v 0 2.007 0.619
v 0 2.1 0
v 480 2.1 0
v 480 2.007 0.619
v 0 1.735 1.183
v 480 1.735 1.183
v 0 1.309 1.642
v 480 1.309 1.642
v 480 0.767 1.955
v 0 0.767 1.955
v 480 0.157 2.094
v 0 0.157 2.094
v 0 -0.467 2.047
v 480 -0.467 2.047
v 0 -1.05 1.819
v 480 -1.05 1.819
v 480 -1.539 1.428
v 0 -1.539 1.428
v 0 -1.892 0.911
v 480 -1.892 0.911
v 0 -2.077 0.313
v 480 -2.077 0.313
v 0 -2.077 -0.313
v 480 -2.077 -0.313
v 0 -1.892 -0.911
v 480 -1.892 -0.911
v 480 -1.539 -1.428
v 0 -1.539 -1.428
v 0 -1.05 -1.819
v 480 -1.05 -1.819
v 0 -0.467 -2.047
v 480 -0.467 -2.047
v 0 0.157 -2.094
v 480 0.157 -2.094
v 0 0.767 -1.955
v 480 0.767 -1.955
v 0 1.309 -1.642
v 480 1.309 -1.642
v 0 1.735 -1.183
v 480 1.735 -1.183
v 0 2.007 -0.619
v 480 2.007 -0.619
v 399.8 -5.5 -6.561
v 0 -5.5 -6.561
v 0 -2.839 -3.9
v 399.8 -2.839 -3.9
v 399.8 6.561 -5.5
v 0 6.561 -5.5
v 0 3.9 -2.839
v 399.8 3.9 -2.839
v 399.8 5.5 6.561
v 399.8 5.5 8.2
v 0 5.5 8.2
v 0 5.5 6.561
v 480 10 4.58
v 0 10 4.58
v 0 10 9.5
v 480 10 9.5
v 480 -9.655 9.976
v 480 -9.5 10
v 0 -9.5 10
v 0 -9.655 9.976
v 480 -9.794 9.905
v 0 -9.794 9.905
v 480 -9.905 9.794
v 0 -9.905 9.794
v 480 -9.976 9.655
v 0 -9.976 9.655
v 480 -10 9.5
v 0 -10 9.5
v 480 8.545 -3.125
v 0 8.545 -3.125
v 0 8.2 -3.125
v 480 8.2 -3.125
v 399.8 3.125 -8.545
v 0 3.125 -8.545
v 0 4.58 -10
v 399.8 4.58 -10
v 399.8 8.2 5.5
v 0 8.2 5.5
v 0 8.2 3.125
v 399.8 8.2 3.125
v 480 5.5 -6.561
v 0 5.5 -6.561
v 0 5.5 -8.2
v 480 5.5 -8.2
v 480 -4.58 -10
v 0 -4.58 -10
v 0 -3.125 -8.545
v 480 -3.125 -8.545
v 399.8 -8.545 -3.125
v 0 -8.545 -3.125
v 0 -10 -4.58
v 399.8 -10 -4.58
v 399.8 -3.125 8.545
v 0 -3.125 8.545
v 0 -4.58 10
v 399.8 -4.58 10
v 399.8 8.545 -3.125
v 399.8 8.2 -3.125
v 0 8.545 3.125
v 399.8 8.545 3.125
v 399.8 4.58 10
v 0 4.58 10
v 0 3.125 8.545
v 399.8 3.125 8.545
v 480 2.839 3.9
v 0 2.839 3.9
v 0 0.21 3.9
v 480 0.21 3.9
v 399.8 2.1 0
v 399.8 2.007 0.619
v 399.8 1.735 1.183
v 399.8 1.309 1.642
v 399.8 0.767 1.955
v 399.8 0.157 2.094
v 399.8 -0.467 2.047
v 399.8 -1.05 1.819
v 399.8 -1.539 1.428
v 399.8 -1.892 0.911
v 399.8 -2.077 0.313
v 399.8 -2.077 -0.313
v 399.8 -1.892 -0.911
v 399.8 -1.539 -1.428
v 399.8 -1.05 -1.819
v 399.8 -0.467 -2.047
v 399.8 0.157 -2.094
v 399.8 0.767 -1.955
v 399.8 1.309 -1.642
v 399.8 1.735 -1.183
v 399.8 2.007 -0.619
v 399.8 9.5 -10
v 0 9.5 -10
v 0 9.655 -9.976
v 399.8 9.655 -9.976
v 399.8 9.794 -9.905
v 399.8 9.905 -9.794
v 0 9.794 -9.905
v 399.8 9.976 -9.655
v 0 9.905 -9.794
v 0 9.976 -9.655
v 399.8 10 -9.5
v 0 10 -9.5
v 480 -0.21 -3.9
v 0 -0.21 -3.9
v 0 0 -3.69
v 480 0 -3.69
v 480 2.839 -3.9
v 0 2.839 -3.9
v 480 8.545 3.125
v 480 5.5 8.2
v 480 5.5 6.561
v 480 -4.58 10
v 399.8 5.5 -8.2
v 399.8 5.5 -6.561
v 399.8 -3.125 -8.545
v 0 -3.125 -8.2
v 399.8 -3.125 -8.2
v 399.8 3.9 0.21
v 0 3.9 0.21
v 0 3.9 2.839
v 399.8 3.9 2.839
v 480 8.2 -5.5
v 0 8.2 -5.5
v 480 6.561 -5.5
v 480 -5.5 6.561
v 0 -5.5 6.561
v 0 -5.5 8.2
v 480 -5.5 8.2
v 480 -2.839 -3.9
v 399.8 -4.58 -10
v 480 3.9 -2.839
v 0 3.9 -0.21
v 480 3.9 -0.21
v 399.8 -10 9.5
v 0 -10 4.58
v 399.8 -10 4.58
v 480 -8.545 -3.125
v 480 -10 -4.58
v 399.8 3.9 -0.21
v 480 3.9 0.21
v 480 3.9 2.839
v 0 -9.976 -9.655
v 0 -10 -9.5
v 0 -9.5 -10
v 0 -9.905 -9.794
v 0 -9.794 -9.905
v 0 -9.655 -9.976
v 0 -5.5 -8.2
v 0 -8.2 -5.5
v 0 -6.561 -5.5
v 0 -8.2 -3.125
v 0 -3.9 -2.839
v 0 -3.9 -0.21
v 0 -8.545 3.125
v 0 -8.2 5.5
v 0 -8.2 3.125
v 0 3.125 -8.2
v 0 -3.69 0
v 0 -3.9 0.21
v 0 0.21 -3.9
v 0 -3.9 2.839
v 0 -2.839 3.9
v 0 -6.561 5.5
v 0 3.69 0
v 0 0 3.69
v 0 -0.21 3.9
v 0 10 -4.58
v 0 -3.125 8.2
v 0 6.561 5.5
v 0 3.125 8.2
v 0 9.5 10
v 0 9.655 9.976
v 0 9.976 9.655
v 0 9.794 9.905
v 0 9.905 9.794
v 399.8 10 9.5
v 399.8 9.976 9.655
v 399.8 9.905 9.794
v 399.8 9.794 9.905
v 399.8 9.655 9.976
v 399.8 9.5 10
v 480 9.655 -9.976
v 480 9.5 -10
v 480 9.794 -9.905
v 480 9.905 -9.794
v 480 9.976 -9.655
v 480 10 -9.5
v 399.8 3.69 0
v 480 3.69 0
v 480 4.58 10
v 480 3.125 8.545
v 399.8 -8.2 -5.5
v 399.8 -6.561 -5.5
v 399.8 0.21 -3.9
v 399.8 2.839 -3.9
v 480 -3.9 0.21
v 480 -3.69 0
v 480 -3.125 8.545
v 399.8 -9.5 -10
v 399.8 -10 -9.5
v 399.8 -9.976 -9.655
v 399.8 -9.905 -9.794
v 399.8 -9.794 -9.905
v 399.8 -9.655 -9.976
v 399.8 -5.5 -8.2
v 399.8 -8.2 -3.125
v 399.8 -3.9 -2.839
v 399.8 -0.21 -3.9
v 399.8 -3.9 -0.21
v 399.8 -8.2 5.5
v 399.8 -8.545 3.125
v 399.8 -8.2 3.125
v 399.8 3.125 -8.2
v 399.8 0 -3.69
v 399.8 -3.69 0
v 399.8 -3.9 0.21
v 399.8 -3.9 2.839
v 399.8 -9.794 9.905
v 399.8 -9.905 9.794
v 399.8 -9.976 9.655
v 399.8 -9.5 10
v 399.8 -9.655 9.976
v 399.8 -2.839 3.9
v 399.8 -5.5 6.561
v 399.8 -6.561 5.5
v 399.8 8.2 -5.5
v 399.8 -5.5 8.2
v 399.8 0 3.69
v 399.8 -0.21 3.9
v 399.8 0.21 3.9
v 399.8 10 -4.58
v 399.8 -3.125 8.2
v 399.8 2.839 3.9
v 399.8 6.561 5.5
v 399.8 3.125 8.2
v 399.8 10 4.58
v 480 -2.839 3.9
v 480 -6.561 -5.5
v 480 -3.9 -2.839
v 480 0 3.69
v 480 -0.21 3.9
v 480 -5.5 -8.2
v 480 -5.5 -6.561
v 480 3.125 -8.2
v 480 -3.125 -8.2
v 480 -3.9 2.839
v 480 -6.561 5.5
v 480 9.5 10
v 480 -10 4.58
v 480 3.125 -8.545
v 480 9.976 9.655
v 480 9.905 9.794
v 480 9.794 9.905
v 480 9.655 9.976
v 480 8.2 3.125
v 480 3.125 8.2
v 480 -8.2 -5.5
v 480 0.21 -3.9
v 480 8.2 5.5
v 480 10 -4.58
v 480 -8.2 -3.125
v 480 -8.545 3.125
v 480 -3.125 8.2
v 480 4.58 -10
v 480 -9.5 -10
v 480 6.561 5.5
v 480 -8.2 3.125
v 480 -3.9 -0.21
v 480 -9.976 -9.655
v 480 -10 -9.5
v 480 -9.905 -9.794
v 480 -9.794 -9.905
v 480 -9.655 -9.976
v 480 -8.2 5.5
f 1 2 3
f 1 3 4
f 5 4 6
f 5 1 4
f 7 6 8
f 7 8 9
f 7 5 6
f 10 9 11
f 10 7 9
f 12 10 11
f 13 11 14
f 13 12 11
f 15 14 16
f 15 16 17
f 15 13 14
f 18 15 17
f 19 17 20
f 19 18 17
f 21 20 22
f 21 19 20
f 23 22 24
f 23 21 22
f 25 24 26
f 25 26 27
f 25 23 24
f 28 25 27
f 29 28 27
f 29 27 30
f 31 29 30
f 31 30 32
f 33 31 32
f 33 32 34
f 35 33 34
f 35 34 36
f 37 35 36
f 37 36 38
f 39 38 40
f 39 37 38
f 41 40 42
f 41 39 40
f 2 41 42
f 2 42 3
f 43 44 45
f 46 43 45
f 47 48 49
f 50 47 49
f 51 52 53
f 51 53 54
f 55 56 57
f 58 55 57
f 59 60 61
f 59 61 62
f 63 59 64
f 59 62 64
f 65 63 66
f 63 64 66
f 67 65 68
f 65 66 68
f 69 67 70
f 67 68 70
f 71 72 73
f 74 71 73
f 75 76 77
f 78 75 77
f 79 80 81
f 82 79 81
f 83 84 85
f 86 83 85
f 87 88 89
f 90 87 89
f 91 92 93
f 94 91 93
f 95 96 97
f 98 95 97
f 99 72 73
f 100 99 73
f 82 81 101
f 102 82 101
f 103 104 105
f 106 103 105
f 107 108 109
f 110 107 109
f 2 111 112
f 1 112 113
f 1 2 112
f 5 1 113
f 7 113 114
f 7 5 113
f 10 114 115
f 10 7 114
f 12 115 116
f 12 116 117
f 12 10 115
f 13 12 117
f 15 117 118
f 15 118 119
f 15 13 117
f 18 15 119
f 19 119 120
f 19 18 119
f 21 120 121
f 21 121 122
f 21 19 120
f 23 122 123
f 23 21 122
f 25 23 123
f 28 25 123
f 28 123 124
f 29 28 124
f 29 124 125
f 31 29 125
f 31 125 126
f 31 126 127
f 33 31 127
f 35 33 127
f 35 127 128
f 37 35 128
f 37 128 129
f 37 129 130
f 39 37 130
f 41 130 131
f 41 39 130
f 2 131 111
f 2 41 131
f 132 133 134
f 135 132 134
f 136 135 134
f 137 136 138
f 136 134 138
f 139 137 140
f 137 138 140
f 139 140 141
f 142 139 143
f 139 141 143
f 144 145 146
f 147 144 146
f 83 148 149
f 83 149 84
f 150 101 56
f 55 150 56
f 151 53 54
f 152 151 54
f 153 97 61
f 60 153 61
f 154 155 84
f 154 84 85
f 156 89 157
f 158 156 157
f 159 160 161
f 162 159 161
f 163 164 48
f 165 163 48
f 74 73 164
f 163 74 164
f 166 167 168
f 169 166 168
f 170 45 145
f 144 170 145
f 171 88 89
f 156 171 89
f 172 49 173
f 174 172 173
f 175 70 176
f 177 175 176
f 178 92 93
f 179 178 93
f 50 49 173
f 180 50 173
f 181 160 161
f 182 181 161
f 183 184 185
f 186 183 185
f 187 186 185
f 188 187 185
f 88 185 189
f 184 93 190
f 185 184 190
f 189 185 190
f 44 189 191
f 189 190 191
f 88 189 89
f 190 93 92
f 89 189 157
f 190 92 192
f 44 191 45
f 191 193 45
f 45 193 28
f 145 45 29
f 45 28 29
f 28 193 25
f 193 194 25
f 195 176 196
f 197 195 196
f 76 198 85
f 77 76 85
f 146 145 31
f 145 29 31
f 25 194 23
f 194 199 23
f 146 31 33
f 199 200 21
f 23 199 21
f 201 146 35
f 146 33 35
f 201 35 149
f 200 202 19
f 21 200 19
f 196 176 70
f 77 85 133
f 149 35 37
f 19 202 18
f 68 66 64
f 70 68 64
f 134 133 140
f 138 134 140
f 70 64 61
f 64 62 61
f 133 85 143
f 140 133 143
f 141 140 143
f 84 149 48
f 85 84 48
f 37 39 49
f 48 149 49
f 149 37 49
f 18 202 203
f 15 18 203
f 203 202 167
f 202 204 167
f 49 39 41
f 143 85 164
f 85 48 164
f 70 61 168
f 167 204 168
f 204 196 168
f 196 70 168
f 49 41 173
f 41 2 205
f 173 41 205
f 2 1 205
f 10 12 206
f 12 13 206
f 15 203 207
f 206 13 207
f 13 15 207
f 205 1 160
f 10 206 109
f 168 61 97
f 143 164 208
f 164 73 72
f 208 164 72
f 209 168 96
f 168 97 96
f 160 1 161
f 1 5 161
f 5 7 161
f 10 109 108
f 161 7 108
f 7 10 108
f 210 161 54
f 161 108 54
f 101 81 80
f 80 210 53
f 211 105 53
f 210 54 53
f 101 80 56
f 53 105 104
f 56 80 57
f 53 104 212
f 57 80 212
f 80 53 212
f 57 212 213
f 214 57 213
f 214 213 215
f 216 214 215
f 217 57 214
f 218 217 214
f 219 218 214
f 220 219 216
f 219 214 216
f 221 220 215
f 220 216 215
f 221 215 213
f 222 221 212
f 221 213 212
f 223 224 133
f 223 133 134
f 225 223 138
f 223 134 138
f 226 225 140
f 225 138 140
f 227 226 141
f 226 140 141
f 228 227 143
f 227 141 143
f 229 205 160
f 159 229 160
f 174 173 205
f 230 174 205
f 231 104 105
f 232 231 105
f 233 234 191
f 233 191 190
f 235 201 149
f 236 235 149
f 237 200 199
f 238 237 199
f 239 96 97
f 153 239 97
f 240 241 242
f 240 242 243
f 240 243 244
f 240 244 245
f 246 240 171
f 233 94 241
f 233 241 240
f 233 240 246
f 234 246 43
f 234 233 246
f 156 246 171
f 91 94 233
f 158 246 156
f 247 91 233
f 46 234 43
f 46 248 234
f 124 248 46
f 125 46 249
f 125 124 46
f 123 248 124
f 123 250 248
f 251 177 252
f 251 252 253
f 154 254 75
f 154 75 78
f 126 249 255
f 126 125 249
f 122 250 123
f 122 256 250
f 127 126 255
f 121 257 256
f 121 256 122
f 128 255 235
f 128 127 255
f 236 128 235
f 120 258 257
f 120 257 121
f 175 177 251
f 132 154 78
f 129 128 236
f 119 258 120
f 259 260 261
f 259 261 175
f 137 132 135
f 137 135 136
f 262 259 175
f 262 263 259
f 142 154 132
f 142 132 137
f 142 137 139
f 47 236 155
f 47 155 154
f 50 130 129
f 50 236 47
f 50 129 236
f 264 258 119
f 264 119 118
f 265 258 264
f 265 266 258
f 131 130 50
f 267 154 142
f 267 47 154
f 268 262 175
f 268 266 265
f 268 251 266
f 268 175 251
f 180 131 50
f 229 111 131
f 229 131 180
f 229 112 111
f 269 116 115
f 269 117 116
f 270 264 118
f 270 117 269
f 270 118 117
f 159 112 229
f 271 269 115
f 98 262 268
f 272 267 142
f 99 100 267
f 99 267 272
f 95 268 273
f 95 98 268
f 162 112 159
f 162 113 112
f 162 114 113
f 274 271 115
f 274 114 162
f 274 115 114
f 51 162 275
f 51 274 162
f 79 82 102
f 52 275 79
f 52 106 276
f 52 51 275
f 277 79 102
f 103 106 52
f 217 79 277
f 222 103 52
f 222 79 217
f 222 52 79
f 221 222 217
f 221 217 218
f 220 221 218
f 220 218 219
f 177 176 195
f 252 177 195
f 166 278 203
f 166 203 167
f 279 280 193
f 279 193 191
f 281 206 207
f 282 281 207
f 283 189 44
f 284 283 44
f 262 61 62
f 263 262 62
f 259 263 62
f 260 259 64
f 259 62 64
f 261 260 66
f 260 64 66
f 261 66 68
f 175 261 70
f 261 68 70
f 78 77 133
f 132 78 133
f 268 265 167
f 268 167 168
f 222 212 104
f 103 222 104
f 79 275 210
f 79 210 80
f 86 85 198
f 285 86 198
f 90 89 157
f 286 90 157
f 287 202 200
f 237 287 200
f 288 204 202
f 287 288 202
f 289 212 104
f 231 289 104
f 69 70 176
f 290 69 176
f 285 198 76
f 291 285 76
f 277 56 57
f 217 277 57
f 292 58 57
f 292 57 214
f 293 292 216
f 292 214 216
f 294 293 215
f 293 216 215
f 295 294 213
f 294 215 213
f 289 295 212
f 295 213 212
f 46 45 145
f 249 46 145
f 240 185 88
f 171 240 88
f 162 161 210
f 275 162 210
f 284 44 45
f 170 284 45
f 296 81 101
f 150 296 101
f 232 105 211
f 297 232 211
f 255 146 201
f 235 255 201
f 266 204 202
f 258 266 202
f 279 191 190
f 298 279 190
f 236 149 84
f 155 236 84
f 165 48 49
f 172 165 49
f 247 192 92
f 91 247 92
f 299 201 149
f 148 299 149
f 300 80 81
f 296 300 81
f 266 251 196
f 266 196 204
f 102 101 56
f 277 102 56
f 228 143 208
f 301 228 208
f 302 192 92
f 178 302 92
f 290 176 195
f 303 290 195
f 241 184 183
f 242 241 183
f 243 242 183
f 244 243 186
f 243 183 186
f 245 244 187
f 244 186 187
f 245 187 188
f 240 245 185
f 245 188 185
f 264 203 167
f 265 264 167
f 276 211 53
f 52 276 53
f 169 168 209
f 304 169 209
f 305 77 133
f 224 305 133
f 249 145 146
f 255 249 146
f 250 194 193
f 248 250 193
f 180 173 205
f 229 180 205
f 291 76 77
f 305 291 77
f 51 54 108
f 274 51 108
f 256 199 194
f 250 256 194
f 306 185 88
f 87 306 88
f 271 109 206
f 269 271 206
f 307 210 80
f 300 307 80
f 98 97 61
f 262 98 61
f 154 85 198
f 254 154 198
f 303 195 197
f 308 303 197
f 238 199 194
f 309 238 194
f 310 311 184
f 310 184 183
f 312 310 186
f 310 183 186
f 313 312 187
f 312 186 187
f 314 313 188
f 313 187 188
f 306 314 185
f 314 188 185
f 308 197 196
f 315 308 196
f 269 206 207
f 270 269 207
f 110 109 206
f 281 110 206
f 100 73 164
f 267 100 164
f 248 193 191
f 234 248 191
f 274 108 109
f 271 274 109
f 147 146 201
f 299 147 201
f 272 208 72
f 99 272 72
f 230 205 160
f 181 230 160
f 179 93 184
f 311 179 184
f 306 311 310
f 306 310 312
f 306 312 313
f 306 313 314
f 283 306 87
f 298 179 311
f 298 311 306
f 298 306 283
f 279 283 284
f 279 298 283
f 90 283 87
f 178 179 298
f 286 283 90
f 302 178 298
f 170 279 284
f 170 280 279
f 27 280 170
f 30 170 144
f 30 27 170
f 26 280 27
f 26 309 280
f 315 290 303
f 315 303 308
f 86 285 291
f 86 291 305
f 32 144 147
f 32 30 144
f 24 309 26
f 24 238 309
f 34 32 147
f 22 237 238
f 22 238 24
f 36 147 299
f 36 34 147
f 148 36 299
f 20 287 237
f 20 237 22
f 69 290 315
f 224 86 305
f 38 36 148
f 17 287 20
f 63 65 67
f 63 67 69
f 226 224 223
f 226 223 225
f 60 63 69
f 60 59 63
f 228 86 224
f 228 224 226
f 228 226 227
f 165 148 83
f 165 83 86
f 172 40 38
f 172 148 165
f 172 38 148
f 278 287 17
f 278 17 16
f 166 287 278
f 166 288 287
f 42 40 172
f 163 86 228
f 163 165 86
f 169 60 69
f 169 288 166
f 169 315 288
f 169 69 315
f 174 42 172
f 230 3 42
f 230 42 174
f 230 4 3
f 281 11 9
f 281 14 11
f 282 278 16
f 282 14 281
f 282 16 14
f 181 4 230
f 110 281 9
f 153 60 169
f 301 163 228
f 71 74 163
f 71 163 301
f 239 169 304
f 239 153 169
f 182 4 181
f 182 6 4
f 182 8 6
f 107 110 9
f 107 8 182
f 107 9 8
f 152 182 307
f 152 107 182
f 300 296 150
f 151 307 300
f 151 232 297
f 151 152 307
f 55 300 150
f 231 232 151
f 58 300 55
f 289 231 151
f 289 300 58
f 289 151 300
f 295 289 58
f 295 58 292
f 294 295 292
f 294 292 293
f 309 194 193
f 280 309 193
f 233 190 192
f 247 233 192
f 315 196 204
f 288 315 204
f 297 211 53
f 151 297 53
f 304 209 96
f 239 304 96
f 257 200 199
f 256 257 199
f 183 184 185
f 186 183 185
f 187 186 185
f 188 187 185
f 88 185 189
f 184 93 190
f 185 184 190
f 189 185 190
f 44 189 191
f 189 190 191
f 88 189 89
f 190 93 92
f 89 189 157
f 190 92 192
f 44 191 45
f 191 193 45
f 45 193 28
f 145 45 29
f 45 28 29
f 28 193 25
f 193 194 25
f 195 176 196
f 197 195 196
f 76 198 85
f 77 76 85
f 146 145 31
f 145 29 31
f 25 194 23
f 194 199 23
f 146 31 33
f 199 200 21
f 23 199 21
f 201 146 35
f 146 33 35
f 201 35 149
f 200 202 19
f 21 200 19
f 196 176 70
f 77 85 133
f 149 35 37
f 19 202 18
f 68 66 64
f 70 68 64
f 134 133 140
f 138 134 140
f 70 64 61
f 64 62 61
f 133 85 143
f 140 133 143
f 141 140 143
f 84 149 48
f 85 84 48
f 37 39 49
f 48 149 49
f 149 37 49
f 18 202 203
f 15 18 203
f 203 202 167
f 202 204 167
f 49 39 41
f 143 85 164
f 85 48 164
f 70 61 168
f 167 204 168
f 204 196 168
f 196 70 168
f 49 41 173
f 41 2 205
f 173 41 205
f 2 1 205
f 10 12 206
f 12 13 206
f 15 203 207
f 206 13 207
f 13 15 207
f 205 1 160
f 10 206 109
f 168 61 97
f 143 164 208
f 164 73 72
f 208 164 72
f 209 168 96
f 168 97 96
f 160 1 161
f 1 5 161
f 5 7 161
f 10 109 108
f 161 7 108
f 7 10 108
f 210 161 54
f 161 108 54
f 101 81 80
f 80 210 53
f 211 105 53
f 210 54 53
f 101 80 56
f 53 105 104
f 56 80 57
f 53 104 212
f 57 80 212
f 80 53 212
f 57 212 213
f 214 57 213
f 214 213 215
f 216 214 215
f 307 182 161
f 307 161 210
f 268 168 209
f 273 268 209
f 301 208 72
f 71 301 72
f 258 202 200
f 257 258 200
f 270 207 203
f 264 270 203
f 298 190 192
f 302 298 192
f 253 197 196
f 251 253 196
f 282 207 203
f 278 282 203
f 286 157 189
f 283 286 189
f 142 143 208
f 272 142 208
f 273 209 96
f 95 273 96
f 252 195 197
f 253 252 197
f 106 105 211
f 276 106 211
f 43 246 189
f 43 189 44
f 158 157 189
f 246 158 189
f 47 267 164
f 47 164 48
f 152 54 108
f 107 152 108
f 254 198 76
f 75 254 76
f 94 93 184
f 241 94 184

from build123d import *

# Parameters (mm, degrees)
F0_R     = 2.1
F1_DEPTH = 399.8
F2_DEPTH = 480


with BuildPart() as f1:
    # F0 (on Right) → F1 (new body)
    with BuildSketch(Plane.YZ):
        with BuildLine():
            Line((-10, -4.58), (-10, -9.5))
            ThreePointArc((-10, -9.5), (-9.853553, -9.853553), (-9.5, -10))
            Line((-9.5, -10), (-4.58, -10))
            Line((-4.58, -10), (-3.125, -8.545))
            Line((-3.125, -8.545), (-3.125, -8.2))
            Line((-3.125, -8.2), (-5.5, -8.2))
            Line((-5.5, -8.2), (-5.5, -6.56066))
            Line((-5.5, -6.56066), (-2.83934, -3.9))
            Line((-2.83934, -3.9), (-0.21, -3.9))
            Line((-0.21, -3.9), (0, -3.69))
            Line((0, -3.69), (0.21, -3.9))
            Line((0.21, -3.9), (2.83934, -3.9))
            Line((2.83934, -3.9), (5.5, -6.56066))
            Line((5.5, -6.56066), (5.5, -8.2))
            Line((5.5, -8.2), (3.125, -8.2))
            Line((3.125, -8.2), (3.125, -8.545))
            Line((3.125, -8.545), (4.58, -10))
            Line((4.58, -10), (9.5, -10))
            ThreePointArc((9.5, -10), (9.853553, -9.853553), (10, -9.5))
            Line((10, -9.5), (10, -4.58))
            Line((10, -4.58), (8.545, -3.125))
            Line((8.545, -3.125), (8.2, -3.125))
            Line((8.2, -3.125), (8.2, -5.5))
            Line((8.2, -5.5), (6.56066, -5.5))
            Line((6.56066, -5.5), (3.9, -2.83934))
            Line((3.9, -2.83934), (3.9, -0.21))
            Line((3.9, -0.21), (3.69, 0))
            Line((3.69, 0), (3.9, 0.21))
            Line((3.9, 0.21), (3.9, 2.83934))
            Line((3.9, 2.83934), (6.56066, 5.5))
            Line((6.56066, 5.5), (8.2, 5.5))
            Line((8.2, 5.5), (8.2, 3.125))
            Line((8.2, 3.125), (8.545, 3.125))
            Line((8.545, 3.125), (10, 4.58))
            Line((10, 4.58), (10, 9.5))
            ThreePointArc((10, 9.5), (9.853553, 9.853553), (9.5, 10))
            Line((9.5, 10), (4.58, 10))
            Line((4.58, 10), (3.125, 8.545))
            Line((3.125, 8.545), (3.125, 8.2))
            Line((3.125, 8.2), (5.5, 8.2))
            Line((5.5, 8.2), (5.5, 6.56066))
            Line((5.5, 6.56066), (2.83934, 3.9))
            Line((2.83934, 3.9), (0.21, 3.9))
            Line((0.21, 3.9), (0, 3.69))
            Line((0, 3.69), (-0.21, 3.9))
            Line((-0.21, 3.9), (-2.83934, 3.9))
            Line((-2.83934, 3.9), (-5.5, 6.56066))
            Line((-5.5, 6.56066), (-5.5, 8.2))
            Line((-5.5, 8.2), (-3.125, 8.2))
            Line((-3.125, 8.2), (-3.125, 8.545))
            Line((-3.125, 8.545), (-4.58, 10))
            Line((-4.58, 10), (-9.5, 10))
            ThreePointArc((-9.5, 10), (-9.853553, 9.853553), (-10, 9.5))
            Line((-10, 9.5), (-10, 4.58))
            Line((-10, 4.58), (-8.545, 3.125))
            Line((-8.545, 3.125), (-8.2, 3.125))
            Line((-8.2, 3.125), (-8.2, 5.5))
            Line((-8.2, 5.5), (-6.56066, 5.5))
            Line((-6.56066, 5.5), (-3.9, 2.83934))
            Line((-3.9, 2.83934), (-3.9, 0.21))
            Line((-3.9, 0.21), (-3.69, 0))
            Line((-3.69, 0), (-3.9, -0.21))
            Line((-3.9, -0.21), (-3.9, -2.83934))
            Line((-3.9, -2.83934), (-6.56066, -5.5))
            Line((-6.56066, -5.5), (-8.2, -5.5))
            Line((-8.2, -5.5), (-8.2, -3.125))
            Line((-8.2, -3.125), (-8.545, -3.125))
            Line((-8.545, -3.125), (-10, -4.58))
        make_face()
        Circle(F0_R, mode=Mode.SUBTRACT)
    extrude(amount=F1_DEPTH)


with BuildPart() as f2:
    # F0 (on Right) → F2 (new body)
    with BuildSketch(Plane.YZ):
        with BuildLine():
            Line((-10, -4.58), (-10, -9.5))
            ThreePointArc((-10, -9.5), (-9.853553, -9.853553), (-9.5, -10))
            Line((-9.5, -10), (-4.58, -10))
            Line((-4.58, -10), (-3.125, -8.545))
            Line((-3.125, -8.545), (-3.125, -8.2))
            Line((-3.125, -8.2), (-5.5, -8.2))
            Line((-5.5, -8.2), (-5.5, -6.56066))
            Line((-5.5, -6.56066), (-2.83934, -3.9))
            Line((-2.83934, -3.9), (-0.21, -3.9))
            Line((-0.21, -3.9), (0, -3.69))
            Line((0, -3.69), (0.21, -3.9))
            Line((0.21, -3.9), (2.83934, -3.9))
            Line((2.83934, -3.9), (5.5, -6.56066))
            Line((5.5, -6.56066), (5.5, -8.2))
            Line((5.5, -8.2), (3.125, -8.2))
            Line((3.125, -8.2), (3.125, -8.545))
            Line((3.125, -8.545), (4.58, -10))
            Line((4.58, -10), (9.5, -10))
            ThreePointArc((9.5, -10), (9.853553, -9.853553), (10, -9.5))
            Line((10, -9.5), (10, -4.58))
            Line((10, -4.58), (8.545, -3.125))
            Line((8.545, -3.125), (8.2, -3.125))
            Line((8.2, -3.125), (8.2, -5.5))
            Line((8.2, -5.5), (6.56066, -5.5))
            Line((6.56066, -5.5), (3.9, -2.83934))
            Line((3.9, -2.83934), (3.9, -0.21))
            Line((3.9, -0.21), (3.69, 0))
            Line((3.69, 0), (3.9, 0.21))
            Line((3.9, 0.21), (3.9, 2.83934))
            Line((3.9, 2.83934), (6.56066, 5.5))
            Line((6.56066, 5.5), (8.2, 5.5))
            Line((8.2, 5.5), (8.2, 3.125))
            Line((8.2, 3.125), (8.545, 3.125))
            Line((8.545, 3.125), (10, 4.58))
            Line((10, 4.58), (10, 9.5))
            ThreePointArc((10, 9.5), (9.853553, 9.853553), (9.5, 10))
            Line((9.5, 10), (4.58, 10))
            Line((4.58, 10), (3.125, 8.545))
            Line((3.125, 8.545), (3.125, 8.2))
            Line((3.125, 8.2), (5.5, 8.2))
            Line((5.5, 8.2), (5.5, 6.56066))
            Line((5.5, 6.56066), (2.83934, 3.9))
            Line((2.83934, 3.9), (0.21, 3.9))
            Line((0.21, 3.9), (0, 3.69))
            Line((0, 3.69), (-0.21, 3.9))
            Line((-0.21, 3.9), (-2.83934, 3.9))
            Line((-2.83934, 3.9), (-5.5, 6.56066))
            Line((-5.5, 6.56066), (-5.5, 8.2))
            Line((-5.5, 8.2), (-3.125, 8.2))
            Line((-3.125, 8.2), (-3.125, 8.545))
            Line((-3.125, 8.545), (-4.58, 10))
            Line((-4.58, 10), (-9.5, 10))
            ThreePointArc((-9.5, 10), (-9.853553, 9.853553), (-10, 9.5))
            Line((-10, 9.5), (-10, 4.58))
            Line((-10, 4.58), (-8.545, 3.125))
            Line((-8.545, 3.125), (-8.2, 3.125))
            Line((-8.2, 3.125), (-8.2, 5.5))
            Line((-8.2, 5.5), (-6.56066, 5.5))
            Line((-6.56066, 5.5), (-3.9, 2.83934))
            Line((-3.9, 2.83934), (-3.9, 0.21))
            Line((-3.9, 0.21), (-3.69, 0))
            Line((-3.69, 0), (-3.9, -0.21))
            Line((-3.9, -0.21), (-3.9, -2.83934))
            Line((-3.9, -2.83934), (-6.56066, -5.5))
            Line((-6.56066, -5.5), (-8.2, -5.5))
            Line((-8.2, -5.5), (-8.2, -3.125))
            Line((-8.2, -3.125), (-8.545, -3.125))
            Line((-8.545, -3.125), (-10, -4.58))
        make_face()
        Circle(F0_R, mode=Mode.SUBTRACT)
    extrude(amount=F2_DEPTH)


solid = Compound([f1.part, f2.part])
